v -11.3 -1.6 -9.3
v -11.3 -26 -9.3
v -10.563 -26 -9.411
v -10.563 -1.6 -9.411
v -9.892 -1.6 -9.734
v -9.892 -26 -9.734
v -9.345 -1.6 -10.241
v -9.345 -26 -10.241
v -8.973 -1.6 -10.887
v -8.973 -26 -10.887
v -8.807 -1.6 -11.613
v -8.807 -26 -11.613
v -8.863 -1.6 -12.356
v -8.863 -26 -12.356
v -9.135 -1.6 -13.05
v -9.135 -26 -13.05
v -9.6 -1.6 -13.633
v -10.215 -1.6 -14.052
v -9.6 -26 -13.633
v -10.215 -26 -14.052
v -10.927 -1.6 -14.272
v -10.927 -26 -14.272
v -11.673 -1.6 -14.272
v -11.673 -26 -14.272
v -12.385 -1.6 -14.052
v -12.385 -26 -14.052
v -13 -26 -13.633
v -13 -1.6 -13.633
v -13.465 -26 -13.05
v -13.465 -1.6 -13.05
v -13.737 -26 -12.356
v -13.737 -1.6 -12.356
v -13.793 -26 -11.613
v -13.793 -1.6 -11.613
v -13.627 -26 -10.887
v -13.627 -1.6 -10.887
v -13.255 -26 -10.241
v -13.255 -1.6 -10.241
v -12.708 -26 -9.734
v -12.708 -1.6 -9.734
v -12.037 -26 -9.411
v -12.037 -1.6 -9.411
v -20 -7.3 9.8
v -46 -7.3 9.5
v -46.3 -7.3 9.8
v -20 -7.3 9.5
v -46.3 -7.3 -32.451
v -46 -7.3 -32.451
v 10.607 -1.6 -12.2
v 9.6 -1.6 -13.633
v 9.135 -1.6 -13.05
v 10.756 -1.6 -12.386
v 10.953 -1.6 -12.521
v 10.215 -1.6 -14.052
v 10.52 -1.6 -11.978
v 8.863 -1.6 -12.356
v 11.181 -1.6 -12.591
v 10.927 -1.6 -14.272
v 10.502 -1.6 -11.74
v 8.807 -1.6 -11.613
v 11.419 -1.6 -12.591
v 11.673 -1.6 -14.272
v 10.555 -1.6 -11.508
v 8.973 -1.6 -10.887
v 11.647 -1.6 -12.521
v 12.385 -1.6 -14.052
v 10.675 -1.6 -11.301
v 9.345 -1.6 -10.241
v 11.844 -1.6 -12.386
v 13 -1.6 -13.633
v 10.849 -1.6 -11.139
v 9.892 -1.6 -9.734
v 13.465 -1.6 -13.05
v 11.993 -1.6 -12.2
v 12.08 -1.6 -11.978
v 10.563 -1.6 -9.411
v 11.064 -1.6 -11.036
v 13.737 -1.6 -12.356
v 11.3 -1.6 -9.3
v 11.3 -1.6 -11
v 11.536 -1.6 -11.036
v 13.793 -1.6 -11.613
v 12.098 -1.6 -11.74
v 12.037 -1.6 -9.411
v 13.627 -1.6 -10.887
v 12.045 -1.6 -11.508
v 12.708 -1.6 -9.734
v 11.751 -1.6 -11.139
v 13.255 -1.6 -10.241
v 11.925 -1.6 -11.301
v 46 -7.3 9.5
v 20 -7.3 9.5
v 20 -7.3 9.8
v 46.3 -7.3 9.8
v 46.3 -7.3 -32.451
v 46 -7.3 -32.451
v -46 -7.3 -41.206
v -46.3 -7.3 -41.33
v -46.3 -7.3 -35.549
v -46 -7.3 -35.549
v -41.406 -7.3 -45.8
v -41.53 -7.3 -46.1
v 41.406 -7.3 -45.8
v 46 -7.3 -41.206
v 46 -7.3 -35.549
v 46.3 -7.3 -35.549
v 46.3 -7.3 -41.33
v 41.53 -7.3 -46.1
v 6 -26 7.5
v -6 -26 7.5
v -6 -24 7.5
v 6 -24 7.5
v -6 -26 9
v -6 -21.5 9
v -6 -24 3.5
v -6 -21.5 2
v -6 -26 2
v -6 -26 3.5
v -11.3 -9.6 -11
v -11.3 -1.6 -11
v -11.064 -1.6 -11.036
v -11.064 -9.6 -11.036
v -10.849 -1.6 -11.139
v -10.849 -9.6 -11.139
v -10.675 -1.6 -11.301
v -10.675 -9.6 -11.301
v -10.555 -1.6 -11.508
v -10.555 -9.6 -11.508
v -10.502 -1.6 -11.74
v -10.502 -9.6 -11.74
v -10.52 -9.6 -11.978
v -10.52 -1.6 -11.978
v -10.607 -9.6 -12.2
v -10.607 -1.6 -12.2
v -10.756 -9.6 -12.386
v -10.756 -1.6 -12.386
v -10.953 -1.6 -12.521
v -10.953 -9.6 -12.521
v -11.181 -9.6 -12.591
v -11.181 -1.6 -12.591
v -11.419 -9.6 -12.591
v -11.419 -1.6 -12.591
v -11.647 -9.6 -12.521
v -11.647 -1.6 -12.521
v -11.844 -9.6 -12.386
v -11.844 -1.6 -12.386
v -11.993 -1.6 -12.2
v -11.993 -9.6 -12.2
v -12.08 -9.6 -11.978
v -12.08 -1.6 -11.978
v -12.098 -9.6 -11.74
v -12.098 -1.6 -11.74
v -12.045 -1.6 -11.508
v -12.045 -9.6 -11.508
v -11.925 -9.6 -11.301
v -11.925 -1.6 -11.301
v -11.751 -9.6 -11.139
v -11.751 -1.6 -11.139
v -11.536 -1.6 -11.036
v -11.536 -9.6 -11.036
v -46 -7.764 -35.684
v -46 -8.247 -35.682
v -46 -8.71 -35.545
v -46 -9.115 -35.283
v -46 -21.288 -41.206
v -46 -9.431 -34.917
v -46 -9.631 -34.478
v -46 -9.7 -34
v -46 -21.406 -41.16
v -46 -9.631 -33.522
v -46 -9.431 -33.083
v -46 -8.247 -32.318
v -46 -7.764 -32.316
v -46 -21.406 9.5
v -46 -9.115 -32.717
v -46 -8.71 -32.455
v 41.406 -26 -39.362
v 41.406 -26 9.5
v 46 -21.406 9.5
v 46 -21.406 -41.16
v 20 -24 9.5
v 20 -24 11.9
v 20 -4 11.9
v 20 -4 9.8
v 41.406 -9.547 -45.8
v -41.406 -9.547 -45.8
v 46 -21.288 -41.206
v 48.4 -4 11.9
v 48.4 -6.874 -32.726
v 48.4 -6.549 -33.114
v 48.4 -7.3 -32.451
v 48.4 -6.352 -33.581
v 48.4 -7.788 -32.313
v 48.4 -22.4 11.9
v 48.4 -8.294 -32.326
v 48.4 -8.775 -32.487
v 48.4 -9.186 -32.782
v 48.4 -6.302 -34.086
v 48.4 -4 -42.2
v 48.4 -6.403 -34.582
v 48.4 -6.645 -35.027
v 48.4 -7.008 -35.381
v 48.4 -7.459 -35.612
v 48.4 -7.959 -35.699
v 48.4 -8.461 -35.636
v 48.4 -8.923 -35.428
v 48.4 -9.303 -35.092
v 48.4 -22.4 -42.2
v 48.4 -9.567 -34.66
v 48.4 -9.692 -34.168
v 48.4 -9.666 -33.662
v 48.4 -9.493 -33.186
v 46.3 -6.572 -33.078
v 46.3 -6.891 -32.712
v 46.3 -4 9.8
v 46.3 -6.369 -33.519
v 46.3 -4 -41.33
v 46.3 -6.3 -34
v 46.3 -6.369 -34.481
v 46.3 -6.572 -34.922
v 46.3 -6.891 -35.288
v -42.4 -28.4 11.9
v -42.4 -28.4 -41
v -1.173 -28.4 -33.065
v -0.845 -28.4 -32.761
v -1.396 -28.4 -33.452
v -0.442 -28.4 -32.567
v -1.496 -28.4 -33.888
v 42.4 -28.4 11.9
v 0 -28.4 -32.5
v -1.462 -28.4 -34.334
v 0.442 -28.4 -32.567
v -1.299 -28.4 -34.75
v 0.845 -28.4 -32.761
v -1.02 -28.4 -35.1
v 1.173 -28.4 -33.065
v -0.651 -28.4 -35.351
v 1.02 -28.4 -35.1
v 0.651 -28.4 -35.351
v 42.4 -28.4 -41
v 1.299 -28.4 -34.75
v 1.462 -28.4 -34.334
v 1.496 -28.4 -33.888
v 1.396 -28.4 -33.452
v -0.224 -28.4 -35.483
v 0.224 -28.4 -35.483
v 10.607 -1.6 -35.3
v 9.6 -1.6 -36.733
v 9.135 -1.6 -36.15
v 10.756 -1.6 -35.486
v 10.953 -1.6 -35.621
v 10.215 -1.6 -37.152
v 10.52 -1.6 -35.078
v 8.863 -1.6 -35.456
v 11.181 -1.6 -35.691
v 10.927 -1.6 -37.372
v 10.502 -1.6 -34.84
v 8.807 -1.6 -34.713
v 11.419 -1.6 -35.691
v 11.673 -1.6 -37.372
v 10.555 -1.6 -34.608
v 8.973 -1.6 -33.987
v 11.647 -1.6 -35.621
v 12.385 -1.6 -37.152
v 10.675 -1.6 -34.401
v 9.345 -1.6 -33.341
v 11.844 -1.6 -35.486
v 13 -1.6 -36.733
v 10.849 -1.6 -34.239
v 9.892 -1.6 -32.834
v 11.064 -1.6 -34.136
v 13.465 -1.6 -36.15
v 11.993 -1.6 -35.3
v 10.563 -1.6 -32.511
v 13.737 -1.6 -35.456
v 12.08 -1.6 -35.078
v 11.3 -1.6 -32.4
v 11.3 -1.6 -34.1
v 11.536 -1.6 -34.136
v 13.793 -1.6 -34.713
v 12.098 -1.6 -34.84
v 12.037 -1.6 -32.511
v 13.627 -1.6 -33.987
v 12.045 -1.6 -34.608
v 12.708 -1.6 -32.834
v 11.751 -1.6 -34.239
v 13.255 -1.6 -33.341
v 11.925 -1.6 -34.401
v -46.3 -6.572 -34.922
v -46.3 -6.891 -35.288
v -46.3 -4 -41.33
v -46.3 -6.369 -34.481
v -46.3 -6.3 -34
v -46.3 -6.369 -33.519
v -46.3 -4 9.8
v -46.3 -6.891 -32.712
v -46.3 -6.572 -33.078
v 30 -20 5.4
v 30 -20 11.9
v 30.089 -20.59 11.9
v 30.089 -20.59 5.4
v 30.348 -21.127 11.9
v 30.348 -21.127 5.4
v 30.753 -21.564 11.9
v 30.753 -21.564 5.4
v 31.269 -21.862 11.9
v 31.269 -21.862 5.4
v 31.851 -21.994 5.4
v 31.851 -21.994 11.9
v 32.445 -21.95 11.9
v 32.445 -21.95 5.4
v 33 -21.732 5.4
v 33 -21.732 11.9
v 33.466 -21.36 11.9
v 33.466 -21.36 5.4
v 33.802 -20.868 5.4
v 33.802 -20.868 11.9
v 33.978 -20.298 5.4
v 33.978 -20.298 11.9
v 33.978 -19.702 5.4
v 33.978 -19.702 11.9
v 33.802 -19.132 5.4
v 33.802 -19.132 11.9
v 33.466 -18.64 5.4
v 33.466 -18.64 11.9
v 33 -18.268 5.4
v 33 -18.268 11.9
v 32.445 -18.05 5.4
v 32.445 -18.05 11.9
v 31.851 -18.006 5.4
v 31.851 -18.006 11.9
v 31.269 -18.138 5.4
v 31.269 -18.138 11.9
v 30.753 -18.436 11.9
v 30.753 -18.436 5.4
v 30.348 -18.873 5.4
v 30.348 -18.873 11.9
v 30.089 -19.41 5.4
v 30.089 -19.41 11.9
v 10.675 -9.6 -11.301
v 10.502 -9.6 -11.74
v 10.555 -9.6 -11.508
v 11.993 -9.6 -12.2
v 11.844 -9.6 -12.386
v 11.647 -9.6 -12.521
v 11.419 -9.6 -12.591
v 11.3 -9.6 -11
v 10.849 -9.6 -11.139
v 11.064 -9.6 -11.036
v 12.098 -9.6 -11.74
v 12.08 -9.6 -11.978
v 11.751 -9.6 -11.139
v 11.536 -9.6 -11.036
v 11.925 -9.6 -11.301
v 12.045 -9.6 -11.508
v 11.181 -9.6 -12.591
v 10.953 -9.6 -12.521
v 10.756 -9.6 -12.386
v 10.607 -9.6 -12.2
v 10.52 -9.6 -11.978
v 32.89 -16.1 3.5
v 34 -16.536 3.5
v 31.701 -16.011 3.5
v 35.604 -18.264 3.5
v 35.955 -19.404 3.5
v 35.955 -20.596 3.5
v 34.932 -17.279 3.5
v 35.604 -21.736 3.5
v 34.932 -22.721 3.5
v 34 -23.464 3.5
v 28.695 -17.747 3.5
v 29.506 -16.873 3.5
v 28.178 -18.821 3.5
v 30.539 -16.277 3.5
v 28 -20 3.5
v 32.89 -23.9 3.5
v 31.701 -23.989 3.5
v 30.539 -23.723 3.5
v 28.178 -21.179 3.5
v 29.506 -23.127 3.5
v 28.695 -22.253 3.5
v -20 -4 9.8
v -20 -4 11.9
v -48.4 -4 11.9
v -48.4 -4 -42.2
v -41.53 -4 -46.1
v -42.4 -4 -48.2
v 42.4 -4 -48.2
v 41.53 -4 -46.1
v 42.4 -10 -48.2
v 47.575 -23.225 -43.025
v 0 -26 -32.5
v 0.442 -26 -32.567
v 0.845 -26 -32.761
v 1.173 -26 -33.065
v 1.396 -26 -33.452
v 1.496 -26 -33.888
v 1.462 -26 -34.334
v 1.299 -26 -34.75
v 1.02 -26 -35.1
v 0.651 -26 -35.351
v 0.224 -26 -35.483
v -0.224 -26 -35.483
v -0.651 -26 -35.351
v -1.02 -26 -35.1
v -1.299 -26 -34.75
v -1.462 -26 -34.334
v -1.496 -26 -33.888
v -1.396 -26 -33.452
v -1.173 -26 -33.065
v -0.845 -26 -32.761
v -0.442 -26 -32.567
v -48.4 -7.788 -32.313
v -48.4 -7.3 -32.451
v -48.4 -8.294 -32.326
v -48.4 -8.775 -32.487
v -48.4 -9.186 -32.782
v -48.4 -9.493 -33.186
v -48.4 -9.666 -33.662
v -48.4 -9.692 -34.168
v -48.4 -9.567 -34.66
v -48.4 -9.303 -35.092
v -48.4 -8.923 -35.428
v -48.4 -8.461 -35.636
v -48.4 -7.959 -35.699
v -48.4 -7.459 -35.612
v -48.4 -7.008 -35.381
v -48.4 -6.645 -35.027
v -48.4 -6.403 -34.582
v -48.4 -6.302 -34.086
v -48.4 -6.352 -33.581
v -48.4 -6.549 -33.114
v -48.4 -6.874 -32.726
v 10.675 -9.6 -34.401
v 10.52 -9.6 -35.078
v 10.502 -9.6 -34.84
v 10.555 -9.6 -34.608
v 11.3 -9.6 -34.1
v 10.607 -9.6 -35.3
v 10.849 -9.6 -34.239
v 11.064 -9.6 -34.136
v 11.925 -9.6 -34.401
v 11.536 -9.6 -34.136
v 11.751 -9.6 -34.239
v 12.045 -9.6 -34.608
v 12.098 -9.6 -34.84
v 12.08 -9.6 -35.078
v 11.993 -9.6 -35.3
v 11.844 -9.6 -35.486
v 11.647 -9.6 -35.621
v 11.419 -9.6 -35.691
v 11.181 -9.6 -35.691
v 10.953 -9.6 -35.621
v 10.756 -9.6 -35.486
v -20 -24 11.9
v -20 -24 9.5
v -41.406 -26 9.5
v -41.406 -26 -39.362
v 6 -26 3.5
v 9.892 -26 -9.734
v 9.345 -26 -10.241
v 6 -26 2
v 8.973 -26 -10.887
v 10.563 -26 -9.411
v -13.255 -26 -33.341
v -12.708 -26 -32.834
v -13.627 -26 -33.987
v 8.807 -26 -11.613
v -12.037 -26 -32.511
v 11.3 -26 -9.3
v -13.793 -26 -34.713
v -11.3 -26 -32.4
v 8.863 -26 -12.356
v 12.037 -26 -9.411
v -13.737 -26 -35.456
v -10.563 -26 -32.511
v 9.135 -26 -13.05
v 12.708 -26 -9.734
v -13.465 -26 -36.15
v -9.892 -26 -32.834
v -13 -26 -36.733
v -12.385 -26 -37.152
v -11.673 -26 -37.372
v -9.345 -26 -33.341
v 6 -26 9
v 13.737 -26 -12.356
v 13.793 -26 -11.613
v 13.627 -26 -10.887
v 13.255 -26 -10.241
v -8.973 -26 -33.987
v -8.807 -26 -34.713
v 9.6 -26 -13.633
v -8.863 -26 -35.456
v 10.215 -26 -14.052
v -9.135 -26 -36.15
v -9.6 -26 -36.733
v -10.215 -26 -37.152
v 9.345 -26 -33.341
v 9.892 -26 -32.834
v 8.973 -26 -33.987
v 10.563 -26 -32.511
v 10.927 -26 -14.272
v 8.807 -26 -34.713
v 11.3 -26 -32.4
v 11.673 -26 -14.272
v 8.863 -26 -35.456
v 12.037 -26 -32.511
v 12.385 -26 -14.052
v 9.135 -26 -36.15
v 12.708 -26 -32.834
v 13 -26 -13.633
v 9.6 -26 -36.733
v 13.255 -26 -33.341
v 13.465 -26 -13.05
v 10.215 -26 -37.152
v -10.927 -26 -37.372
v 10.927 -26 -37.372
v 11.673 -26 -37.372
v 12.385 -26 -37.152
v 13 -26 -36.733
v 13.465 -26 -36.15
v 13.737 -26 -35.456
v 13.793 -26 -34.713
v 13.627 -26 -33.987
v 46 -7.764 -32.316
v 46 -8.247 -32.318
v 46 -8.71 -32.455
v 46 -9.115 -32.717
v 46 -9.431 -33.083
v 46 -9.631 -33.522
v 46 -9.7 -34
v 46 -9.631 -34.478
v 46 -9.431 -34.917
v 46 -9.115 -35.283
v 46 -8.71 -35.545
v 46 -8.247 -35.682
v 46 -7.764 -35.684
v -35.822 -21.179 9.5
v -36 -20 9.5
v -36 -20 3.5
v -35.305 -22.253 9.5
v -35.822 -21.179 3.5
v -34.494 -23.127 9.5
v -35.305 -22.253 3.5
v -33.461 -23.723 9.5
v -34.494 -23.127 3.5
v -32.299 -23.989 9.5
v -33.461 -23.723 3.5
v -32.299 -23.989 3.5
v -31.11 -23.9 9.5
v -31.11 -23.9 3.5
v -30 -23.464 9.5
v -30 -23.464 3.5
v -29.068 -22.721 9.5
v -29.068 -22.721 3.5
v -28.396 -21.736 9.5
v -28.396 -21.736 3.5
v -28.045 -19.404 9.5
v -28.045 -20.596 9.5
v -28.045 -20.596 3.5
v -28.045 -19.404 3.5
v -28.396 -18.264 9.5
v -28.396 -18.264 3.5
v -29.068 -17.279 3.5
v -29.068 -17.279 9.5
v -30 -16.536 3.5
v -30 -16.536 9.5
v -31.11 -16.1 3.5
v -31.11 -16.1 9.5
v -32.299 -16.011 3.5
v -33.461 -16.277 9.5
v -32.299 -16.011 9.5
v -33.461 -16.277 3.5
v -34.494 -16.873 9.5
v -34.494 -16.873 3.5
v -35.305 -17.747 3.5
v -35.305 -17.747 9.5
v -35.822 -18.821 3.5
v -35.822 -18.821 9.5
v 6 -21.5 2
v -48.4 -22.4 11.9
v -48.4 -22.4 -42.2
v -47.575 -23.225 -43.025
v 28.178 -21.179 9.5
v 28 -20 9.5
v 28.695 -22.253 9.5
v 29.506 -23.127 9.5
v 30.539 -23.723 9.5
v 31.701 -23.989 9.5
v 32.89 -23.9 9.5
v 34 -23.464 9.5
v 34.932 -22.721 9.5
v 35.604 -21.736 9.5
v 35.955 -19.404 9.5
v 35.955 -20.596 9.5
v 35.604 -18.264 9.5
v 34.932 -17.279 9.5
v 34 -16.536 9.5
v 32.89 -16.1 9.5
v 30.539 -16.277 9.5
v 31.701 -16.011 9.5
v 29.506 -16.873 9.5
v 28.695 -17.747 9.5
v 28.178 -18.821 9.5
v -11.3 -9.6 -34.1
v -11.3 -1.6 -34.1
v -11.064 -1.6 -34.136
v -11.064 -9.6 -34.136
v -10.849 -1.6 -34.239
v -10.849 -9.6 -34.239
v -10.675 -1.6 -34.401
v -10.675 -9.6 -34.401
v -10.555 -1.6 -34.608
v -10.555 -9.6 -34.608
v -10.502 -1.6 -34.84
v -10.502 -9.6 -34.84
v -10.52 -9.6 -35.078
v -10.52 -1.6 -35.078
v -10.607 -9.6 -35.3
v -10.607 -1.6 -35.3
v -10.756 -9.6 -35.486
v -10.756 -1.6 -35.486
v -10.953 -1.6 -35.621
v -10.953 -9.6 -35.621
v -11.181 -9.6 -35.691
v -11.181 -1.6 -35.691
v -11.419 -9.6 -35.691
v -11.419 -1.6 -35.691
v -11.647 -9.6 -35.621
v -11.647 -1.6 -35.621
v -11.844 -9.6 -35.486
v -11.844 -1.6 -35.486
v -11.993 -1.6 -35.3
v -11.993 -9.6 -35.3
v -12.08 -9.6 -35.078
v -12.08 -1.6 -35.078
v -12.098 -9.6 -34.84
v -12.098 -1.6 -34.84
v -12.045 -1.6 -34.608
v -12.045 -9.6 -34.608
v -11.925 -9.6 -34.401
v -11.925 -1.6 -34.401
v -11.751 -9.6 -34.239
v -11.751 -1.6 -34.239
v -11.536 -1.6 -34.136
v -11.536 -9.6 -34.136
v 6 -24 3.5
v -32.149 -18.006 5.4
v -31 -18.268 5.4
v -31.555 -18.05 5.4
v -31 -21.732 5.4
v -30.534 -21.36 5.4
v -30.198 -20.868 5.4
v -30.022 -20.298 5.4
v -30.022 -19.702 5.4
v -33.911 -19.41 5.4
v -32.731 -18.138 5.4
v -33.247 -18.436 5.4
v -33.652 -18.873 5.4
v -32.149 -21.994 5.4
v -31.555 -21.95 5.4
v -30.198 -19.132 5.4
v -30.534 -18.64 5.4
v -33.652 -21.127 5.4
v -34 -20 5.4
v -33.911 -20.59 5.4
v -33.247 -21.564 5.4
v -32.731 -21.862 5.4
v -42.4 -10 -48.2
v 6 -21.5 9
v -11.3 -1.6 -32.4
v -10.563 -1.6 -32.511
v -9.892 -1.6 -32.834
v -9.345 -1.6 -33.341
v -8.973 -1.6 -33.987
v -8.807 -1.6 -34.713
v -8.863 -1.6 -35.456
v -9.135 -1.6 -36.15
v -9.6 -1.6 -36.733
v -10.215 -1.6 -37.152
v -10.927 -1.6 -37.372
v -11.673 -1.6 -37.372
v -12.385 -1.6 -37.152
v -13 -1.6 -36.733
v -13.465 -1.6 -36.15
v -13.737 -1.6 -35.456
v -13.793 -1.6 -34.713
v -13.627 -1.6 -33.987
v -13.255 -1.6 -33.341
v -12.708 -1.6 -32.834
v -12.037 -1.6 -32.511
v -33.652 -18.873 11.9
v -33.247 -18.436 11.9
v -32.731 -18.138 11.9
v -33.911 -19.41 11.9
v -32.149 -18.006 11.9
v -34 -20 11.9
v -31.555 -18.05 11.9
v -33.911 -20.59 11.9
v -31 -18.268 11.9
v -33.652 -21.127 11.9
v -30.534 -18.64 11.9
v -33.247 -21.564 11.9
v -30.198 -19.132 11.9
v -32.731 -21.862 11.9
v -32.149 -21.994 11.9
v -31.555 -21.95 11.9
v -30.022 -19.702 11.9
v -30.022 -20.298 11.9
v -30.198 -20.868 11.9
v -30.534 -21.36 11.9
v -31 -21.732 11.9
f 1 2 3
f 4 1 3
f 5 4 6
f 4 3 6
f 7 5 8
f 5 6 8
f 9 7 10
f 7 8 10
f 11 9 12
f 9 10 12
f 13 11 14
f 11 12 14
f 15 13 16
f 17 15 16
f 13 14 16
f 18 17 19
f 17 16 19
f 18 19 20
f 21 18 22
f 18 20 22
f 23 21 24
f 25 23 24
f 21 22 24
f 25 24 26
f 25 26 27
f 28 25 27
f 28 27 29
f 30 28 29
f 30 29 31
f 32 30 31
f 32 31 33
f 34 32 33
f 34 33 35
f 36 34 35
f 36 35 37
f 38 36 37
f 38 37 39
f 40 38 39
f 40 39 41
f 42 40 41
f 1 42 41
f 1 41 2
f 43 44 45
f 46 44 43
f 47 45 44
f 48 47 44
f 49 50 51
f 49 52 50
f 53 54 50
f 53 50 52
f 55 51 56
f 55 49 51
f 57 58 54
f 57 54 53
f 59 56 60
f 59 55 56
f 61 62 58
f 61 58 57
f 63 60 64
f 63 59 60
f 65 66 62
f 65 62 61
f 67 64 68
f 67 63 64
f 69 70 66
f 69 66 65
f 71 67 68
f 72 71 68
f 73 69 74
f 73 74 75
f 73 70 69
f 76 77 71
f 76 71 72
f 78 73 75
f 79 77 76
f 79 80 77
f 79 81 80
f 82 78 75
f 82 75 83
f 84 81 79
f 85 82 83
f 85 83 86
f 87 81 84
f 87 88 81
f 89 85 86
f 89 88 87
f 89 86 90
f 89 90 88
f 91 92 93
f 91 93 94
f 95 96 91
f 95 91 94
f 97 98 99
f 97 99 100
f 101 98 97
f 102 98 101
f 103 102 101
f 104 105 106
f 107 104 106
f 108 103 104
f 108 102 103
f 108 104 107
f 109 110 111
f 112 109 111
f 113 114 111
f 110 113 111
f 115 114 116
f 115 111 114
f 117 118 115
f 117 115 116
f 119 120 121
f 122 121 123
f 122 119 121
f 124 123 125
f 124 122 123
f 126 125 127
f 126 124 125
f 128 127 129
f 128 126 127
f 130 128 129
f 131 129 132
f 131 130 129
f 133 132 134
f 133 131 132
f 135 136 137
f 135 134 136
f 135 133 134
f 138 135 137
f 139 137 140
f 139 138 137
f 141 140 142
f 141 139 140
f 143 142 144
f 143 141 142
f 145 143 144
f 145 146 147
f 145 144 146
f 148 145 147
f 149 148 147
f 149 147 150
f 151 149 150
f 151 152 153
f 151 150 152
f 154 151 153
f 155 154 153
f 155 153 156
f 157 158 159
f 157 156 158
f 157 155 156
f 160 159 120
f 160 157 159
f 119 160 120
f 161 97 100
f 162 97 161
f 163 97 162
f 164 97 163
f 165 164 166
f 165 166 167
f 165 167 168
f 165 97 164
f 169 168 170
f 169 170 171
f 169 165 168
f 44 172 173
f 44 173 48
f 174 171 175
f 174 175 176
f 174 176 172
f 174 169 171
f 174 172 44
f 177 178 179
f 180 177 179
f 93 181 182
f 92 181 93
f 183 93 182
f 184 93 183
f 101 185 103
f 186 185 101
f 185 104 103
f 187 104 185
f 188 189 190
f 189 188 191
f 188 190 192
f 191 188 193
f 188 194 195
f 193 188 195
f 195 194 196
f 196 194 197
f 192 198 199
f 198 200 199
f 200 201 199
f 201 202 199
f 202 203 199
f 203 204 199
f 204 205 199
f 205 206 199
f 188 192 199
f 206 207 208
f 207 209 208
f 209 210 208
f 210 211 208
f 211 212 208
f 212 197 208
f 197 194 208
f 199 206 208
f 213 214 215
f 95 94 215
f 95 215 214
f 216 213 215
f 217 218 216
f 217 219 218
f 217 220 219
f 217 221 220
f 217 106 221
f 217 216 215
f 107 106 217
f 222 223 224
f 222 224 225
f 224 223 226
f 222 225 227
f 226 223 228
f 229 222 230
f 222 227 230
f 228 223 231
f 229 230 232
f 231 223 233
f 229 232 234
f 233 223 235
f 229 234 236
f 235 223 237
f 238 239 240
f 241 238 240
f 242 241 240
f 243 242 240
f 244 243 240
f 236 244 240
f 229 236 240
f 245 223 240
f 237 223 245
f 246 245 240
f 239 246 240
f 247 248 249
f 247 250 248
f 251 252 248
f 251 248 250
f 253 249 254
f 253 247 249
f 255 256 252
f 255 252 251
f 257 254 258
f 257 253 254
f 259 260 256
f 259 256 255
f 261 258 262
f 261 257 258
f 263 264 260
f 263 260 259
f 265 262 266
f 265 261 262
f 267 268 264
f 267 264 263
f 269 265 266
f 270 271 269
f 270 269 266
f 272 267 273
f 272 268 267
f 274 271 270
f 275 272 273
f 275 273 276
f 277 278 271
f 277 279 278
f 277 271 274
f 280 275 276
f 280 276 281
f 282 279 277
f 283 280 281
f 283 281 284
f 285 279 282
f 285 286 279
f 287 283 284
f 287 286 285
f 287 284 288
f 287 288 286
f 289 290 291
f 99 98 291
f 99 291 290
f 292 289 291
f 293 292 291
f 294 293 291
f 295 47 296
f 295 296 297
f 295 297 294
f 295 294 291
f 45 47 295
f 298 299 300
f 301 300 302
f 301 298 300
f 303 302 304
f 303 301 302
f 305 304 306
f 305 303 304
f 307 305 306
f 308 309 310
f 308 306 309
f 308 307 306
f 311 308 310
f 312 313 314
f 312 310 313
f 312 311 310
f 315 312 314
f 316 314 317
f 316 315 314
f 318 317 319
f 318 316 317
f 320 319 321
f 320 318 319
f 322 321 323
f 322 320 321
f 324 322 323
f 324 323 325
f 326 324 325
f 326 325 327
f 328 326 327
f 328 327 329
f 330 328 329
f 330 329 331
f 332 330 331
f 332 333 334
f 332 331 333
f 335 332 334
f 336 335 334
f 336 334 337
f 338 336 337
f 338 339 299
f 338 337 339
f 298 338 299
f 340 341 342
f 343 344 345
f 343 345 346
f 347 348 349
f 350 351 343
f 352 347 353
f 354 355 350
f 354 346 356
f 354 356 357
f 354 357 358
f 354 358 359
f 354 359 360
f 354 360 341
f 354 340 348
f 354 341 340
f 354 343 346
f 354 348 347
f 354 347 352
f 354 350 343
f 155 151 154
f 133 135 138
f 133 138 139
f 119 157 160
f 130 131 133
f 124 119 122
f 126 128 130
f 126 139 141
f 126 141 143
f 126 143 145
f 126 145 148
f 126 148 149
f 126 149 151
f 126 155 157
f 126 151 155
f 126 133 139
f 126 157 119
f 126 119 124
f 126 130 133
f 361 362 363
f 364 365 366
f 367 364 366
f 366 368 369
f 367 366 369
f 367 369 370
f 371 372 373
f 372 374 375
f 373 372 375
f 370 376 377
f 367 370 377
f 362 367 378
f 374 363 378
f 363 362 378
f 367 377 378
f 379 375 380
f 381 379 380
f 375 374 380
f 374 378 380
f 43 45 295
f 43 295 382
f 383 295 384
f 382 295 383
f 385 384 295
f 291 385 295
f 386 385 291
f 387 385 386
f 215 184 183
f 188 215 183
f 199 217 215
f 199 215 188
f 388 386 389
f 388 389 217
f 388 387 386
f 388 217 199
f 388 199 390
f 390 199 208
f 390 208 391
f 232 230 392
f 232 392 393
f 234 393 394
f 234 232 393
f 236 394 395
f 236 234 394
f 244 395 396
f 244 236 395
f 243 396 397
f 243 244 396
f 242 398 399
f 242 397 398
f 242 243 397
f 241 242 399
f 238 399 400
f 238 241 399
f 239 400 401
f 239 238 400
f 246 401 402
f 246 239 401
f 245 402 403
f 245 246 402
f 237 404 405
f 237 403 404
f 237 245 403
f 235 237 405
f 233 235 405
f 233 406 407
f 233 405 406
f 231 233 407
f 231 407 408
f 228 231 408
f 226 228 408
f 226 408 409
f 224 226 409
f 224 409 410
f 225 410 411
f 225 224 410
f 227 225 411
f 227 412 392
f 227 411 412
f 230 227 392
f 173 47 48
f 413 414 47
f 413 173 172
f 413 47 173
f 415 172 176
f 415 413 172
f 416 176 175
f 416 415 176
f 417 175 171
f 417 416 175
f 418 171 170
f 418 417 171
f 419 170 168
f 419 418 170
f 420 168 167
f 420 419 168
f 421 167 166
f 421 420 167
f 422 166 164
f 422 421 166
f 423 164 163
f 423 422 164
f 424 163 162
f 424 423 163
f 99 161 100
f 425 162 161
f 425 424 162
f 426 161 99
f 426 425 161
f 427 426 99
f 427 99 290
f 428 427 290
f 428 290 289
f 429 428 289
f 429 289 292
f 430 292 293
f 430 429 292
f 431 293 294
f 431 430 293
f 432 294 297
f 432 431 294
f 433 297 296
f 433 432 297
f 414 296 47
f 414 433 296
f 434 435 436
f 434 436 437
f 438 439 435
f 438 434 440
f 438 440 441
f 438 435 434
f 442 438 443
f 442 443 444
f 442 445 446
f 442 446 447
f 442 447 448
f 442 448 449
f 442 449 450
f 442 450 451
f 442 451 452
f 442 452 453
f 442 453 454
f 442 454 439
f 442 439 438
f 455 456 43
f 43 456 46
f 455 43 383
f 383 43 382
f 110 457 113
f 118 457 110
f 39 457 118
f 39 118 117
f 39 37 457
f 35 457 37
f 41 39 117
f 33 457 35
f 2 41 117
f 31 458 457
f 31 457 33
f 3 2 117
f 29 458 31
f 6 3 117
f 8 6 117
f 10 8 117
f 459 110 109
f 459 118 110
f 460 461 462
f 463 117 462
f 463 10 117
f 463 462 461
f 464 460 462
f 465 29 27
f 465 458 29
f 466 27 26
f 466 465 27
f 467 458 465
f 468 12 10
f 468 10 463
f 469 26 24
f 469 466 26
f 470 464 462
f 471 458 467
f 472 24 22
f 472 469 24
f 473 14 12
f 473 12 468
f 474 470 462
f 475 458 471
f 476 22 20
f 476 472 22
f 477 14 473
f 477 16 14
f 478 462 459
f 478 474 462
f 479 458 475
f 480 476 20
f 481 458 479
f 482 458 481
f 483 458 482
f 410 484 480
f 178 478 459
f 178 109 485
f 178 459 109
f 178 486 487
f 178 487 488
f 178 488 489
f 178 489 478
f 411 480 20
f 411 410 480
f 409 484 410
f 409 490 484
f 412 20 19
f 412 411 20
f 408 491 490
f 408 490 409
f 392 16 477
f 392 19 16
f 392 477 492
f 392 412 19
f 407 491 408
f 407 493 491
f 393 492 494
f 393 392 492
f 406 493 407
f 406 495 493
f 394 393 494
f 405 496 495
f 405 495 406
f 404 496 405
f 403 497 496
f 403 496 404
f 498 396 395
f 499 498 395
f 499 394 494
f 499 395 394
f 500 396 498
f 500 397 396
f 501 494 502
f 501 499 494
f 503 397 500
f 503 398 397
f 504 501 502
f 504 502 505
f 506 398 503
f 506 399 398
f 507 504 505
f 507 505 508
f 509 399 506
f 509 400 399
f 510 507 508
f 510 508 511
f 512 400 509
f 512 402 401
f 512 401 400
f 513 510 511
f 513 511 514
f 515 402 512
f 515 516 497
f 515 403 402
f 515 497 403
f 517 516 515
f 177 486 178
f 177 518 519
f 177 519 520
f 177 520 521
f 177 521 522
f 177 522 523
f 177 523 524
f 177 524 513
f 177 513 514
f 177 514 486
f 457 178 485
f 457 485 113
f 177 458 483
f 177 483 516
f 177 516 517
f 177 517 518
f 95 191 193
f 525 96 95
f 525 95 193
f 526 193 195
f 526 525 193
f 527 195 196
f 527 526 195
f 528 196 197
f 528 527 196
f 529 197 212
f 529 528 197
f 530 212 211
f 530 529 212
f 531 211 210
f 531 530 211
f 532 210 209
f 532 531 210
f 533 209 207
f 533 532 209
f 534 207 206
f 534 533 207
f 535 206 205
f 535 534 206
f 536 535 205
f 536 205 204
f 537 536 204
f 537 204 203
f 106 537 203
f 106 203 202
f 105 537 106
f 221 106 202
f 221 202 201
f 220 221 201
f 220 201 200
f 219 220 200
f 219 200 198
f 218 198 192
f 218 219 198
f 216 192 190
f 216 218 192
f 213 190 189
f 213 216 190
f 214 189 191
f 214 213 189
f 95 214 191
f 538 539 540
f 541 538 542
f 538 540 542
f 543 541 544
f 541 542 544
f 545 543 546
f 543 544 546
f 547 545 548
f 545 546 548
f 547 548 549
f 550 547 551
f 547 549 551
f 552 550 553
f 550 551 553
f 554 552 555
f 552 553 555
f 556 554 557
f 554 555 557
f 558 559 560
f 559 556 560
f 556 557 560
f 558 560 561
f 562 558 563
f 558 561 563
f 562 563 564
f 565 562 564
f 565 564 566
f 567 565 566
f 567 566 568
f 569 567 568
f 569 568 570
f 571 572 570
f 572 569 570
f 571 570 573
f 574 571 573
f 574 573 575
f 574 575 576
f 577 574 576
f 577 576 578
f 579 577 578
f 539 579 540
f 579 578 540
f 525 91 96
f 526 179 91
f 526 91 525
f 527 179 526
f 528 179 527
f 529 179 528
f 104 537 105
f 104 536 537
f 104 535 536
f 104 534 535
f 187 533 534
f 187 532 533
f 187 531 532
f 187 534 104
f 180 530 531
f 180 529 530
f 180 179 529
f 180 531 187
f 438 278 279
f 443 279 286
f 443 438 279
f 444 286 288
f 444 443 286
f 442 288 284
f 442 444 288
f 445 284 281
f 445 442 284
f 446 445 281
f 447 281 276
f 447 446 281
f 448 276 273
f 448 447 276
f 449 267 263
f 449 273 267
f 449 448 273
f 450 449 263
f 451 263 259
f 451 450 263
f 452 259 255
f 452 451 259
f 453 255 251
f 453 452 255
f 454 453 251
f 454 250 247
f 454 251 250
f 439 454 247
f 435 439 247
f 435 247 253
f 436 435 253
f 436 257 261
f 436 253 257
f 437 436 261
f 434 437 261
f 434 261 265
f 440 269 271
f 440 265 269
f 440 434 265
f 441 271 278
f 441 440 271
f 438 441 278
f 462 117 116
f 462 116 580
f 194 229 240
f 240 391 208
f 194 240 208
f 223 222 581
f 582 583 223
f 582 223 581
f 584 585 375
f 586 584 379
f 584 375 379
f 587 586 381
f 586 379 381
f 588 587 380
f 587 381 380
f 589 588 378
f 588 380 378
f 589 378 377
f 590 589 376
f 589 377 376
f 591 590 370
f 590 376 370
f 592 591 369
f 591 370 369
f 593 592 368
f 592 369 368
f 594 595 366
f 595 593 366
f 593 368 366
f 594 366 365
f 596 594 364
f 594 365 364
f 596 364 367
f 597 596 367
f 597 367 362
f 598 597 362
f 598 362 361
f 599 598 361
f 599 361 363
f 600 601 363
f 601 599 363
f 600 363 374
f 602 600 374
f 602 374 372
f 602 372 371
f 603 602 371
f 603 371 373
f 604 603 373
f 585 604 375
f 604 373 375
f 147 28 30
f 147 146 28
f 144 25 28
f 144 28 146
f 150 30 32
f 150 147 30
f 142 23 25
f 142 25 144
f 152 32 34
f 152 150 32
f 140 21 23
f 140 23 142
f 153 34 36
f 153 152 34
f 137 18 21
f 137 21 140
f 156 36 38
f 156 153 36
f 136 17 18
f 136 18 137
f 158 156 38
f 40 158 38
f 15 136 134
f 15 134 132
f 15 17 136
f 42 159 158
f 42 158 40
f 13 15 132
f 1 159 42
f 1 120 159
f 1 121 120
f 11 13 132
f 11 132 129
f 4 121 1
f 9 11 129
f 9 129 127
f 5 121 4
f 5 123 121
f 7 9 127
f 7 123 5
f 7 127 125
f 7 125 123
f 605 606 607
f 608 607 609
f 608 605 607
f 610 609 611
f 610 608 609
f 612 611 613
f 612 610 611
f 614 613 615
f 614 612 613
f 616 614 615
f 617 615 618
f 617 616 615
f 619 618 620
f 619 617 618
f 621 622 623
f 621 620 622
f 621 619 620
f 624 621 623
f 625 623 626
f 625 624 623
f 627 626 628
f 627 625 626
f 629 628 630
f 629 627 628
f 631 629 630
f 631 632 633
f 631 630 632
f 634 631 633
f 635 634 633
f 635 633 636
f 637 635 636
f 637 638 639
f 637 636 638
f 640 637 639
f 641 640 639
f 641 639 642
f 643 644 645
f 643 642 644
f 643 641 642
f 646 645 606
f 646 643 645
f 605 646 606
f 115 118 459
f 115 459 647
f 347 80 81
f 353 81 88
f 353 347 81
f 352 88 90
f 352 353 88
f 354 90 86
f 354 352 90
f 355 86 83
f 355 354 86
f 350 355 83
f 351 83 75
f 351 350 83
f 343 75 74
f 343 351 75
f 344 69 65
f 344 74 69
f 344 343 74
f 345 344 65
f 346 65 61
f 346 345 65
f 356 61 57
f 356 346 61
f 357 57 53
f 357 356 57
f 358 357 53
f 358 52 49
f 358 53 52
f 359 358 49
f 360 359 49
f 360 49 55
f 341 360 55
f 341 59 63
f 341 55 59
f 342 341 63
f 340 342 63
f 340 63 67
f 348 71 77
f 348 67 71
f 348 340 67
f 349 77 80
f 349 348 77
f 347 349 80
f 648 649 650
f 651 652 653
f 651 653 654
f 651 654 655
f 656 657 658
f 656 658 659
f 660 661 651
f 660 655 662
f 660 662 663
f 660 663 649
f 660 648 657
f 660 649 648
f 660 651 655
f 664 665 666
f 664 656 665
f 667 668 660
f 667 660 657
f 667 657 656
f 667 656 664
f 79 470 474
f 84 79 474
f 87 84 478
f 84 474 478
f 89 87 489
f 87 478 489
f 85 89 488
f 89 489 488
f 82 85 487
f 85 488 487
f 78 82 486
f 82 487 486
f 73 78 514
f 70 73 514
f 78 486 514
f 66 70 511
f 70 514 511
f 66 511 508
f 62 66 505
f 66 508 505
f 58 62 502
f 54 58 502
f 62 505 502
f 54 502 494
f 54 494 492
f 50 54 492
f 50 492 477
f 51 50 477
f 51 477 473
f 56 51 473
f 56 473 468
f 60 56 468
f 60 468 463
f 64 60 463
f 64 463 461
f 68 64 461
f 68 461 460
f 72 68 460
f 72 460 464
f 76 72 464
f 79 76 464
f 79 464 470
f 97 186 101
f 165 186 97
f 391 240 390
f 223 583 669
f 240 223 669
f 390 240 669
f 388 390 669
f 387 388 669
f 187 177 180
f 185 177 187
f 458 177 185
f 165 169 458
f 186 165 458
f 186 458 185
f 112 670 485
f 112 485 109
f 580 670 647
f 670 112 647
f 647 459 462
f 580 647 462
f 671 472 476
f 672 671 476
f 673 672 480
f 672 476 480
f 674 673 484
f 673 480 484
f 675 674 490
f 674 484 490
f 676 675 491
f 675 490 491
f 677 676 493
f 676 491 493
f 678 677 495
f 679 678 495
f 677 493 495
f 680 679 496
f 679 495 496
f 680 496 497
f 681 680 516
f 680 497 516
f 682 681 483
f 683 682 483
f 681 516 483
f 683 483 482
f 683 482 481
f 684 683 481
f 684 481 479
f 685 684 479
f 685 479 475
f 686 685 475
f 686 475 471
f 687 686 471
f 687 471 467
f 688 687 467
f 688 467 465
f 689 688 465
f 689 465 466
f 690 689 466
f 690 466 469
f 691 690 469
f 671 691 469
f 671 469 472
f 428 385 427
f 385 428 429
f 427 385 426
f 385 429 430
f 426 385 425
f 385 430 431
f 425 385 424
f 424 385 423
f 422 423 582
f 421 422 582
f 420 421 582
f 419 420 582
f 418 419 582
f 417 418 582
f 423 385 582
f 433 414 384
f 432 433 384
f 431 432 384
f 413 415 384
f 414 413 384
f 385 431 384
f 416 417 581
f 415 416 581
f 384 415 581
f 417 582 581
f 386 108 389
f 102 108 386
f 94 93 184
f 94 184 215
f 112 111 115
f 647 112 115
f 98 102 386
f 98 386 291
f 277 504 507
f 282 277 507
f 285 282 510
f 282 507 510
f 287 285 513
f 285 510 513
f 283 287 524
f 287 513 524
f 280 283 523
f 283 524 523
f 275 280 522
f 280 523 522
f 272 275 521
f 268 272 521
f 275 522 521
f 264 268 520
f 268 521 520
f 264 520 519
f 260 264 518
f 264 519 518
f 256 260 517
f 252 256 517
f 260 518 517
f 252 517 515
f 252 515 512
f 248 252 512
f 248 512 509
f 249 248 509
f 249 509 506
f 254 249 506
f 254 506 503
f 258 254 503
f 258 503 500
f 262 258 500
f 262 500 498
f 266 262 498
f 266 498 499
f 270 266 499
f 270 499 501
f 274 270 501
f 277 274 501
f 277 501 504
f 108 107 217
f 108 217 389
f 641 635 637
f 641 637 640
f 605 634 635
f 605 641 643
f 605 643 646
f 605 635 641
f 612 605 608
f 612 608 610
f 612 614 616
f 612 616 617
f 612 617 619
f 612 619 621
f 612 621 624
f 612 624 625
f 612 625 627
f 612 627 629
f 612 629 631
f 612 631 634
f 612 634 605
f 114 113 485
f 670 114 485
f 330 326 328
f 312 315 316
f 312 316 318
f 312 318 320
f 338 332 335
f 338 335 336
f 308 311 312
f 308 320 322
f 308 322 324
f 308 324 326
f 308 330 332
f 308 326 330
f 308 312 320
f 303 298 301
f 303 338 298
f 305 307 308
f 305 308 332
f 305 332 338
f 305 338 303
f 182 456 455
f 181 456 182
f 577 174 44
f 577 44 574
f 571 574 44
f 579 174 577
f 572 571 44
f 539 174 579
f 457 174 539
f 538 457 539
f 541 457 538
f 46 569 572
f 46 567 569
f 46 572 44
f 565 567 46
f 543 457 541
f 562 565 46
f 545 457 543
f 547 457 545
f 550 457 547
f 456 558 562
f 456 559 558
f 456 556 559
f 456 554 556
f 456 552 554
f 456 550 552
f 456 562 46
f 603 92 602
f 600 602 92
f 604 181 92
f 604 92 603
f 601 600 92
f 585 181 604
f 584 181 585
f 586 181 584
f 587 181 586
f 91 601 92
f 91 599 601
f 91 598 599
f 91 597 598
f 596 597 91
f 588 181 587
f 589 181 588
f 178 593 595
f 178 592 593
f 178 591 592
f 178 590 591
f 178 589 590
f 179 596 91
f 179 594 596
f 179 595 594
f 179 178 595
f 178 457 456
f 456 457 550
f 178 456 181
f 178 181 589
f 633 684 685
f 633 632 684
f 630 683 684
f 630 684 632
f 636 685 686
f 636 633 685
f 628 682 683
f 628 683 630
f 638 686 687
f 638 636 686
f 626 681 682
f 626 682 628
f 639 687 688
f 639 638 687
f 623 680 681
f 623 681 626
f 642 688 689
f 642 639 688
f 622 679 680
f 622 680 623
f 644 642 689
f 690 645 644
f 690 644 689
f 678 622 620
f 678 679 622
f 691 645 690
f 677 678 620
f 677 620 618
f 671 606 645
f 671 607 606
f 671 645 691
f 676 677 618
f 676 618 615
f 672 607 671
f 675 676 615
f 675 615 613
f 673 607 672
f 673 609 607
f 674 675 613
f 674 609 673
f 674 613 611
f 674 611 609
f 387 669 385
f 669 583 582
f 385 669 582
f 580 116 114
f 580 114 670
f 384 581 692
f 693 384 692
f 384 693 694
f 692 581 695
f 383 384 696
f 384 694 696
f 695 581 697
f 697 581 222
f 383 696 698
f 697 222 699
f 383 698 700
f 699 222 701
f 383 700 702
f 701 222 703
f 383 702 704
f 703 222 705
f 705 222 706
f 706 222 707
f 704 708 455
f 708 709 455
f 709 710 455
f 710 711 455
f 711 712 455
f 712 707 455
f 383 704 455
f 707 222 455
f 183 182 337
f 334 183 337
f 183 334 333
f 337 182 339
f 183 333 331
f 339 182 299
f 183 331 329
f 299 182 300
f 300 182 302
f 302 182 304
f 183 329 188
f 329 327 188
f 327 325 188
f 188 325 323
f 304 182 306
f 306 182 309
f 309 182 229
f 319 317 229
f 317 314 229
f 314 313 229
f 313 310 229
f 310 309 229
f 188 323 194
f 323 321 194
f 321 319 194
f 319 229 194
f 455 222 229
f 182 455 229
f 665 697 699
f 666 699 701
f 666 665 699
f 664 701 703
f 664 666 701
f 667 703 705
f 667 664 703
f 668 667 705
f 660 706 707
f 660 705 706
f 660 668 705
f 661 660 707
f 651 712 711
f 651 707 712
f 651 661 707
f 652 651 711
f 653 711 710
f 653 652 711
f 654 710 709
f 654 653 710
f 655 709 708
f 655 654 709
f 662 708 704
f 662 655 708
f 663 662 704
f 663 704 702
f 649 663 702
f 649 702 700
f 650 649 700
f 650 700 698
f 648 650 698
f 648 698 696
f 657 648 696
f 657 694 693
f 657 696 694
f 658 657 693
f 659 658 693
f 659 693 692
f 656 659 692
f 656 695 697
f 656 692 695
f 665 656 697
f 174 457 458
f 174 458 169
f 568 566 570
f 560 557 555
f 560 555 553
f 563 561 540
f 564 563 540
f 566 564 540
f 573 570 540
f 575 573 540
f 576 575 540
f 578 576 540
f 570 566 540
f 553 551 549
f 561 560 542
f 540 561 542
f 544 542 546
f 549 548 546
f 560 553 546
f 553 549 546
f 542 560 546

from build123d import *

# Parameters (mm, degrees)
TRAY_BLOCK_DEPTH              = 24.4
LOWER_FRONT_FACET_DEPTH       = 74.975401317
LOWER_FRONT_FACET_DEPTH_BACK  = 74.975401317
LOWER_SIDE_FACET_L_DEPTH      = 74.975401317
LOWER_SIDE_FACET_L_DEPTH_BACK = 74.975401317
LOWER_SIDE_FACET_R_DEPTH      = 74.975401317
LOWER_SIDE_FACET_R_DEPTH_BACK = 74.975401317
SHELL_T                       = -2.4
SEAM_REBATE_DEPTH             = 4.3
SKETCH6_R                     = 2.5
BOARD_PILLARS_DEPTH           = 24.9
SKETCH7_R                     = 0.8
BOARD_PILOTS_DEPTH            = 8.5
SKETCH8_W                     = 40
SKETCH8_H                     = 21
CABLE_WINDOW_DEPTH            = 3.9
SKETCH9_R                     = 4
FLANGE_BOSSES_DEPTH           = 6.2
SKETCH10_R                    = 2
FLANGE_INSERT_HOLES_DEPTH     = 7
SKETCH11_R                    = 1.7
SEAM_SCREW_HOLE_L_DEPTH       = 3.9
SKETCH12_R                    = 1.7
SEAM_SCREW_HOLE_R_DEPTH       = 3.9
SKETCH13_W                    = 12
SKETCH13_H                    = 7
BUNDLE_TIE_ANCHOR_DEPTH       = 5
SKETCH14_W                    = 4
SKETCH14_H                    = 2
BUNDLE_TIE_SLOT_DEPTH         = 14
SKETCH15_R                    = 1.5
DRAIN_HOLE_DEPTH              = 3.9


with BuildPart() as part:
    # Sketch1 → Tray Block (new body)
    with BuildSketch(Plane(origin=(0, -28.4, 0), x_dir=(1, 0, 0), z_dir=(0, 1, 0))):
        Polygon((-48.4, -11.9), (48.4, -11.9), (48.4, 42.2), (42.4, 48.2), (-42.4, 48.2), (-48.4, 42.2), align=None)
    extrude(amount=TRAY_BLOCK_DEPTH)

    # Sketch2 → Lower Front Facet (cut, two sides: drawn at the far end of the back side and taken through both)
    with BuildSketch(Plane(origin=(0, 0, 0), x_dir=(0, 0, -1), z_dir=(1, 0, 0)).offset(-LOWER_FRONT_FACET_DEPTH_BACK)):
        Polygon((49.64, -6.32), (53.2, -6.32), (53.2, -32.08), (39.56, -32.08), align=None)
    extrude(amount=LOWER_FRONT_FACET_DEPTH + LOWER_FRONT_FACET_DEPTH_BACK, mode=Mode.SUBTRACT)

    # Sketch3 → Lower Side Facet L (cut, two sides: drawn at the far end of the back side and taken through both)
    with BuildSketch(Plane.XY.offset(-LOWER_SIDE_FACET_L_DEPTH_BACK)):
        Polygon((-49.4, -21.4), (-49.4, -29.4), (-41.4, -29.4), align=None)
    extrude(amount=LOWER_SIDE_FACET_L_DEPTH + LOWER_SIDE_FACET_L_DEPTH_BACK, mode=Mode.SUBTRACT)

    # Sketch4 → Lower Side Facet R (cut, two sides: drawn at the far end of the back side and taken through both)
    with BuildSketch(Plane.XY.offset(-LOWER_SIDE_FACET_R_DEPTH_BACK)):
        Polygon((49.4, -21.4), (49.4, -29.4), (41.4, -29.4), align=None)
    extrude(amount=LOWER_SIDE_FACET_R_DEPTH + LOWER_SIDE_FACET_R_DEPTH_BACK, mode=Mode.SUBTRACT)

    # Shell
    shell_openings = [part.faces().sort_by_distance(p)[0] for p in [
        (0, -4, -17.975344882),
    ]]
    offset(amount=SHELL_T, openings=shell_openings, kind=Kind.INTERSECTION)

    # Sketch5 → Seam Rebate (cut)
    with BuildSketch(Plane(origin=(0, -7.3, 0), x_dir=(1, 0, 0), z_dir=(0, 1, 0))):
        Polygon((-46.3, -9.8), (46.3, -9.8), (46.3, 41.330151519), (41.530151519, 46.1), (-41.530151519, 46.1), (-46.3, 41.330151519), align=None)
    extrude(amount=SEAM_REBATE_DEPTH, mode=Mode.SUBTRACT)

    # Sketch6 → Board Pillars (add)
    with BuildSketch(Plane(origin=(0, -26.5, 0), x_dir=(1, 0, 0), z_dir=(0, 1, 0))):
        with Locations(Location((-11.3, 11.8, 0), (0, 0, 270))):
            Circle(SKETCH6_R)
        with Locations(Location((-11.3, 34.9, 0), (0, 0, 270))):
            Circle(SKETCH6_R)
        with Locations(Location((11.3, 11.8, 0), (0, 0, 270))):
            Circle(SKETCH6_R)
        with Locations(Location((11.3, 34.9, 0), (0, 0, 270))):
            Circle(SKETCH6_R)
    extrude(amount=BOARD_PILLARS_DEPTH)

    # Sketch7 → Board Pilots (cut)
    with BuildSketch(Plane(origin=(0, -9.6, 0), x_dir=(1, 0, 0), z_dir=(0, 1, 0))):
        with Locations(Location((-11.3, 11.8, 0), (0, 0, 270))):
            Circle(SKETCH7_R)
        with Locations(Location((-11.3, 34.9, 0), (0, 0, 270))):
            Circle(SKETCH7_R)
        with Locations(Location((11.3, 11.8, 0), (0, 0, 270))):
            Circle(SKETCH7_R)
        with Locations(Location((11.3, 34.9, 0), (0, 0, 270))):
            Circle(SKETCH7_R)
    extrude(amount=BOARD_PILOTS_DEPTH, mode=Mode.SUBTRACT)

    # Sketch8 → Cable Window (cut)
    with BuildSketch(Plane.XY.offset(9)):
        with Locations((0, -13.5)):
            Rectangle(SKETCH8_W, SKETCH8_H)
    extrude(amount=CABLE_WINDOW_DEPTH, mode=Mode.SUBTRACT)

    # Sketch9 → Flange Bosses (add)
    with BuildSketch(Plane.XY.offset(3.5)):
        with Locations(Location((-32, -20, 0), (0, 0, 180))):
            Circle(SKETCH9_R)
        with Locations(Location((32, -20, 0), (0, 0, 180))):
            Circle(SKETCH9_R)
    extrude(amount=FLANGE_BOSSES_DEPTH)

    # Sketch10 → Flange Insert Holes (cut)
    with BuildSketch(Plane.XY.offset(5.4)):
        with Locations(Location((-32, -20, 0), (0, 0, 180))):
            Circle(SKETCH10_R)
        with Locations(Location((32, -20, 0), (0, 0, 180))):
            Circle(SKETCH10_R)
    extrude(amount=FLANGE_INSERT_HOLES_DEPTH, mode=Mode.SUBTRACT)

    # Sketch11 → Seam Screw Hole L (cut)
    with BuildSketch(Plane(origin=(-49.4, 0, 0), x_dir=(0, 0, -1), z_dir=(1, 0, 0))):
        with Locations(Location((34, -8, 0), (0, 0, 155.684260829))):
            Circle(SKETCH11_R)
    extrude(amount=SEAM_SCREW_HOLE_L_DEPTH, mode=Mode.SUBTRACT)

    # Sketch12 → Seam Screw Hole R (cut)
    with BuildSketch(Plane(origin=(45.5, 0, 0), x_dir=(0, 0, -1), z_dir=(1, 0, 0))):
        with Locations(Location((34, -8, 0), (0, 0, 155.684260829))):
            Circle(SKETCH12_R)
    extrude(amount=SEAM_SCREW_HOLE_R_DEPTH, mode=Mode.SUBTRACT)

    # Sketch13 → Bundle Tie Anchor (add)
    with BuildSketch(Plane(origin=(0, -26.5, 0), x_dir=(1, 0, 0), z_dir=(0, 1, 0))):
        with Locations((0, -5.5)):
            Rectangle(SKETCH13_W, SKETCH13_H)
    extrude(amount=BUNDLE_TIE_ANCHOR_DEPTH)

    # Sketch14 → Bundle Tie Slot (cut)
    with BuildSketch(Plane(origin=(-7, 0, 0), x_dir=(0, 0, -1), z_dir=(1, 0, 0))):
        with Locations((-5.5, -25)):
            Rectangle(SKETCH14_W, SKETCH14_H)
    extrude(amount=BUNDLE_TIE_SLOT_DEPTH, mode=Mode.SUBTRACT)

    # Sketch15 → Drain Hole (cut)
    with BuildSketch(Plane(origin=(0, -29.4, 0), x_dir=(1, 0, 0), z_dir=(0, 1, 0))):
        with Locations(Location((0, 34, 0), (0, 0, 270))):
            Circle(SKETCH15_R)
    extrude(amount=DRAIN_HOLE_DEPTH, mode=Mode.SUBTRACT)


solid = part.part
